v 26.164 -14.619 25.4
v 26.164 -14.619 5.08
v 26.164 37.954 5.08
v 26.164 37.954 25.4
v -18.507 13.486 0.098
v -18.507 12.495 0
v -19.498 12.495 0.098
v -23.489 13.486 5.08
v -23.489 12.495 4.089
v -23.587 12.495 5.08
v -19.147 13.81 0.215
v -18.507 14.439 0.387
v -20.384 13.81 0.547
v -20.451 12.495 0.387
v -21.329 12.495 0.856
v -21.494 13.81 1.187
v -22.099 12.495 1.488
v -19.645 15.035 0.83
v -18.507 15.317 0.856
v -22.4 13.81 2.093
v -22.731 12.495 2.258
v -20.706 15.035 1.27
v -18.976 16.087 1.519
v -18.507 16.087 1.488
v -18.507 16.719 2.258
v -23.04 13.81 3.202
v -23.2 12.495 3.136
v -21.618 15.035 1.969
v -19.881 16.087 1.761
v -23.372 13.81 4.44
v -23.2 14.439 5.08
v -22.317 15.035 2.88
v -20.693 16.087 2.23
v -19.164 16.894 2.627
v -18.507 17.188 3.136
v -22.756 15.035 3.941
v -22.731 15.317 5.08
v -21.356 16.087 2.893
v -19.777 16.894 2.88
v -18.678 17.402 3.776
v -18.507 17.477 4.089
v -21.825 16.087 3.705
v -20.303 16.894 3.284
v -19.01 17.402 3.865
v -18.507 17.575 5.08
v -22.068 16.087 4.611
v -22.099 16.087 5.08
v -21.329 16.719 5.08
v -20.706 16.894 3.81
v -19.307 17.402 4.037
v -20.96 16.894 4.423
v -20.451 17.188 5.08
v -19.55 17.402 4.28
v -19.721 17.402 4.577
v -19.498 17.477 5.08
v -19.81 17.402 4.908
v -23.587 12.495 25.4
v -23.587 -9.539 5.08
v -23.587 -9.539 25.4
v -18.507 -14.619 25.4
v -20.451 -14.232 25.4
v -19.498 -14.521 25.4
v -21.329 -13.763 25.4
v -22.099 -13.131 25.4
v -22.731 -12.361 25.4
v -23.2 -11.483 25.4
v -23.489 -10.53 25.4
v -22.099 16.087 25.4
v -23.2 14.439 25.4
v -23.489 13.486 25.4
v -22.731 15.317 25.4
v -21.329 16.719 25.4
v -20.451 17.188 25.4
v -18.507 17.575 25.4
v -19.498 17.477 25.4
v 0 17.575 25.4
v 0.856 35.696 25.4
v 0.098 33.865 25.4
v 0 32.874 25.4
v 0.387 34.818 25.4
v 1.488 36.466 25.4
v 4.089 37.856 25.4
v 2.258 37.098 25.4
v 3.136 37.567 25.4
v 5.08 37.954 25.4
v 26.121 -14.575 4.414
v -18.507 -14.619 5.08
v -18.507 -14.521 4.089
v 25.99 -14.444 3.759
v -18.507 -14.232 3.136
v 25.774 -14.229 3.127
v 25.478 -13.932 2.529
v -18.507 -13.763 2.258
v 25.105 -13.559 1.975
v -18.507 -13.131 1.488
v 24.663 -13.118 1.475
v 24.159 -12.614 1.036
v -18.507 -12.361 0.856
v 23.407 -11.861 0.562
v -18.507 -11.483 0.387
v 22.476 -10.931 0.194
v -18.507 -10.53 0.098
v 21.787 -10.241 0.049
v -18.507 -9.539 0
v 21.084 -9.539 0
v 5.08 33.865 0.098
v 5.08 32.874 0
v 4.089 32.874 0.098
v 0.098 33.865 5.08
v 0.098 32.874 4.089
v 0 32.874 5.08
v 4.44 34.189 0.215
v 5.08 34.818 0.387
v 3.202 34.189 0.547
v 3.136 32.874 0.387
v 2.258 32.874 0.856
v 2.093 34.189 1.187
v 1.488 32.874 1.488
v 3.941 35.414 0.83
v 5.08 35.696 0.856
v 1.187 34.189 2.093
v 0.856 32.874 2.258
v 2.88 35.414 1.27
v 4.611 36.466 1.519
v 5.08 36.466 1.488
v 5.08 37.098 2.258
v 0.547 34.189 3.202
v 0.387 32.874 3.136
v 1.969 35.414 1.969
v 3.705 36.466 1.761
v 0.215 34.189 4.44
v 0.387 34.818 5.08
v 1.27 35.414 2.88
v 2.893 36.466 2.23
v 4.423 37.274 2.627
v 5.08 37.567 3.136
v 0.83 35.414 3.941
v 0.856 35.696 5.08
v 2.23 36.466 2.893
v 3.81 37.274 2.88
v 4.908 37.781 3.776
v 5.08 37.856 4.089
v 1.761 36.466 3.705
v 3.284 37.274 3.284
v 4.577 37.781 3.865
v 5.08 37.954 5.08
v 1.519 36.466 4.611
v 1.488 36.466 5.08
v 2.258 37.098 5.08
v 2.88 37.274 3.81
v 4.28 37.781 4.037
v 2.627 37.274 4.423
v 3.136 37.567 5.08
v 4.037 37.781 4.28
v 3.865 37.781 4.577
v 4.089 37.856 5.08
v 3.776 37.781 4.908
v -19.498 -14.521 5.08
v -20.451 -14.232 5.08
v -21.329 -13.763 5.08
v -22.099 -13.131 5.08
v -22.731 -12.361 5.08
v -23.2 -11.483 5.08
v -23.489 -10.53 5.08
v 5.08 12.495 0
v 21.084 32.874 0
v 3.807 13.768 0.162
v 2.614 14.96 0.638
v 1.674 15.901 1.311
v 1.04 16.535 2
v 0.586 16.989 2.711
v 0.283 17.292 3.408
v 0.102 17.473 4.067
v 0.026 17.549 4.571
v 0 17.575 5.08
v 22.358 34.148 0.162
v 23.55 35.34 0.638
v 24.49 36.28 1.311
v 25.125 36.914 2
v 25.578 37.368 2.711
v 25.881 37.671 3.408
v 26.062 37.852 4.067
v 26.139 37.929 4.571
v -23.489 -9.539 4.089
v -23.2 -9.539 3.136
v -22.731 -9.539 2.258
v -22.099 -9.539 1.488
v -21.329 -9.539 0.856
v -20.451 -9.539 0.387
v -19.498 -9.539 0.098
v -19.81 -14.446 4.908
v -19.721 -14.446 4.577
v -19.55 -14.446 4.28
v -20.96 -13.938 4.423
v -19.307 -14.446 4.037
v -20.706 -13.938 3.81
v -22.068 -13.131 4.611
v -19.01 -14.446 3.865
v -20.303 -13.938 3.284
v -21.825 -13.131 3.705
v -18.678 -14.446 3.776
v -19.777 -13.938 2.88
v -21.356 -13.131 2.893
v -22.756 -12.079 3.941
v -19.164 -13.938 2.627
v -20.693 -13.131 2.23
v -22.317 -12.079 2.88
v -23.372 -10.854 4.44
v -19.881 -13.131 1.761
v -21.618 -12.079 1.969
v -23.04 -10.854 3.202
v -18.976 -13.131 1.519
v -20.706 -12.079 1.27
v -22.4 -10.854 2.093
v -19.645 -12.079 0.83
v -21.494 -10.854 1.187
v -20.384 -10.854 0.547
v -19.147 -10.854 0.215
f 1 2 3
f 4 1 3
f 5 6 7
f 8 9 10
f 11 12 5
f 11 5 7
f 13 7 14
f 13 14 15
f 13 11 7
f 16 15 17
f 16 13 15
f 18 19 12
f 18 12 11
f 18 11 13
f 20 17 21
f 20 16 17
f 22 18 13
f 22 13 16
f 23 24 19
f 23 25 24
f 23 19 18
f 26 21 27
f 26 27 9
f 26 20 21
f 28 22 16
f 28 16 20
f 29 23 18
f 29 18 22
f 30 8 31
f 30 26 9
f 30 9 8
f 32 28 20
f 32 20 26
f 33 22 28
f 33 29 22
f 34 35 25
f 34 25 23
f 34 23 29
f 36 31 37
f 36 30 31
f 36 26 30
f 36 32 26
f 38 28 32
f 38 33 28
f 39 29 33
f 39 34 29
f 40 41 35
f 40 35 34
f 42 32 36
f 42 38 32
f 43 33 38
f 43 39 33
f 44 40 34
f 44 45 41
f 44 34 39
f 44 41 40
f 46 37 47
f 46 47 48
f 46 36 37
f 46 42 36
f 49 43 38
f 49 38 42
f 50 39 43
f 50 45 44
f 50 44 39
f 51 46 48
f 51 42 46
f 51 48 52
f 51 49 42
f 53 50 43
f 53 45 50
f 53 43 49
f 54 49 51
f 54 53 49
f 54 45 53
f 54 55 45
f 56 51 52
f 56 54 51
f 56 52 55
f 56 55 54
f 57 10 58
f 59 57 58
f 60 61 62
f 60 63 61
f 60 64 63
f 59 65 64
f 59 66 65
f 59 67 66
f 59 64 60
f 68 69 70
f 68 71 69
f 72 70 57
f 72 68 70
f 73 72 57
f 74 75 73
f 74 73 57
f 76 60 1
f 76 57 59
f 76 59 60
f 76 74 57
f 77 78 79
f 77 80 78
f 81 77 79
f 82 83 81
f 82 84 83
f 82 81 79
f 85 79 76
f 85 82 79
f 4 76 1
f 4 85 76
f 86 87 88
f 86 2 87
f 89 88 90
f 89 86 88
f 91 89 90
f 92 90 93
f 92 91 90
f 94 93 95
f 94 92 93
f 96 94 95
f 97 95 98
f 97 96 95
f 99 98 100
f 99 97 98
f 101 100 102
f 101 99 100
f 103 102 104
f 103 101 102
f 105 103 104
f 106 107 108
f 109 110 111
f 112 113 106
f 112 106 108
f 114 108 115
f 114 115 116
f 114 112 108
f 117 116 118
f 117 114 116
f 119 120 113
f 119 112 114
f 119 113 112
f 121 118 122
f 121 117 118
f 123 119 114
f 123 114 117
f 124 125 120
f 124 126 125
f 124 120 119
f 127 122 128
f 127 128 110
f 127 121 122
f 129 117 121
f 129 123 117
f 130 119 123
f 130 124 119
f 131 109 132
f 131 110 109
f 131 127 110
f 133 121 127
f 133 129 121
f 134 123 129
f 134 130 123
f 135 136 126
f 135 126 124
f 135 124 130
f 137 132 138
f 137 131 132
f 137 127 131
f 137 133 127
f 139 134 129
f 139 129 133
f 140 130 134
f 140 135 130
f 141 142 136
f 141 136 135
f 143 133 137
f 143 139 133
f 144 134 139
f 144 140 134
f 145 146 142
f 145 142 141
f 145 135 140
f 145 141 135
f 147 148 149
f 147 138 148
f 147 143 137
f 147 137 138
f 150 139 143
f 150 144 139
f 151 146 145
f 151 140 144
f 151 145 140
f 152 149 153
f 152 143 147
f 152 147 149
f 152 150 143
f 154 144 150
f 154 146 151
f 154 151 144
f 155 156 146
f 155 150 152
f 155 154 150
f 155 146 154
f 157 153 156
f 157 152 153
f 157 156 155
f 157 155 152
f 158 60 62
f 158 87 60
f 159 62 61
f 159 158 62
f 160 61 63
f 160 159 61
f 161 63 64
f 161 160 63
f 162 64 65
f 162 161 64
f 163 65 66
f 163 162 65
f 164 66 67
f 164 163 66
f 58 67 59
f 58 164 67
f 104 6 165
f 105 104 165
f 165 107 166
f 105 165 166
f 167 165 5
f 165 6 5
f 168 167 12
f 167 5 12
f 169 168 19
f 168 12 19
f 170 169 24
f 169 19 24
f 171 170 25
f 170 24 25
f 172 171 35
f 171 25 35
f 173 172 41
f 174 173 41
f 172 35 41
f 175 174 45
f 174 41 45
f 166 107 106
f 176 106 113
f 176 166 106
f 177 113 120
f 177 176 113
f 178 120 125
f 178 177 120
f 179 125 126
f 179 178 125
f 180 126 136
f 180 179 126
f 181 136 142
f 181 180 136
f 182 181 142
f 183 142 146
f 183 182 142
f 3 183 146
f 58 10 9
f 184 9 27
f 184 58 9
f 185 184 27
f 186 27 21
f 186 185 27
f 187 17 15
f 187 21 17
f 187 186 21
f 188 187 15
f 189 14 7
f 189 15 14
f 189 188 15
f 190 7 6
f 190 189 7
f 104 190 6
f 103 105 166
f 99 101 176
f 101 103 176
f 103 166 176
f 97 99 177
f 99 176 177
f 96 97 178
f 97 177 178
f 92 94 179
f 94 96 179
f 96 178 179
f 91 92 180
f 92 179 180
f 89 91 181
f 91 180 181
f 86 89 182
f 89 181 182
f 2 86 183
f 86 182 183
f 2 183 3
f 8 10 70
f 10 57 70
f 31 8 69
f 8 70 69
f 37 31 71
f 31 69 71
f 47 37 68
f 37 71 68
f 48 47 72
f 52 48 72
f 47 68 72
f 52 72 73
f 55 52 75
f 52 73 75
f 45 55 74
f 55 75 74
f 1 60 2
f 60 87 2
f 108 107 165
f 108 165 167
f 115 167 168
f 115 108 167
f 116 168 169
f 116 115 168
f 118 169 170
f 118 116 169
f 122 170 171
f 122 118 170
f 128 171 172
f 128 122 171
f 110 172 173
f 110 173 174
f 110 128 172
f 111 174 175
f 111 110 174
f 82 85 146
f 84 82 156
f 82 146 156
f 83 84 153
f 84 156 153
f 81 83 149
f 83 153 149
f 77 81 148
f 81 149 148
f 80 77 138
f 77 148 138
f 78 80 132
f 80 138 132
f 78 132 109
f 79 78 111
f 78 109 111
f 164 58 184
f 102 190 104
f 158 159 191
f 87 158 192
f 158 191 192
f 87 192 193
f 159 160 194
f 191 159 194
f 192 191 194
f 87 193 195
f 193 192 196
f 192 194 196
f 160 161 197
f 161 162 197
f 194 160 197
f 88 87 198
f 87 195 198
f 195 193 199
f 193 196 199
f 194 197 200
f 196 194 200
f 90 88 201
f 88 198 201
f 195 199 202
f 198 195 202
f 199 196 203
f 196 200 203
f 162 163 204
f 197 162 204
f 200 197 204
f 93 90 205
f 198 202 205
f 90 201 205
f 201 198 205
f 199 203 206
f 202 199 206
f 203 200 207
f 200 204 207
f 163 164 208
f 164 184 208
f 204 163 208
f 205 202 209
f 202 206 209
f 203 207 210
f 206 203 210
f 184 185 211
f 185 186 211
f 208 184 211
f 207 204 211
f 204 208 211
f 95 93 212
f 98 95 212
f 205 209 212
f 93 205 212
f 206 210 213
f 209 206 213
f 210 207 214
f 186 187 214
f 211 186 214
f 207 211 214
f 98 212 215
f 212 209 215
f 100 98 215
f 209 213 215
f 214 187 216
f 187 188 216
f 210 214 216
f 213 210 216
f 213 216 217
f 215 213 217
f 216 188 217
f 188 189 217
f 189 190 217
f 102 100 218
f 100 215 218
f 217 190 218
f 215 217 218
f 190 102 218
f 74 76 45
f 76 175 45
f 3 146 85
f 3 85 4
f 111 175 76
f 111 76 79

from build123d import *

# Parameters (mm, degrees)
F0_W        = 23.5866680741
F0_H        = 16.0968005657
F0_W_2      = 26.164457202
F0_H_2      = 20.3793495893
F1_DEPTH    = 25.4
F2_R        = 5.08
F3_R        = 5.08
F4_T1_DEPTH = 33.02
F4_S5_W     = 5.08
F4_S5_H     = 5.08
F4_T6_DEPTH = 5.08


# Not quite as in the source:
# - a fillet or chamfer that OpenCascade refuses, or shapes differently, is made with other operations: its cross-section is extruded or revolved along the edge and cut away or added


with BuildPart() as f1:
    # F0 (on Top) → F1 (new body)
    with BuildSketch(Plane.XY):
        with Locations((-11.7933340371, -6.5704584122)):
            Rectangle(F0_W, F0_H)
        with Locations((13.082228601, 9.5263421535)):
            Rectangle(F0_W_2, F0_H)
        with Locations((-11.7933340371, 9.5263421535)):
            Rectangle(F0_W, F0_H)
        with Locations((13.082228601, 27.7644172311)):
            Rectangle(F0_W_2, F0_H_2)
        with Locations((13.082228601, -6.5704584122)):
            Rectangle(F0_W_2, F0_H)
    extrude(amount=F1_DEPTH)

    # F2
    f2_edges = [f1.edges().sort_by_distance(p)[0] for p in [
        (-23.586668, 1.477942, 0),
    ]]
    fillet(f2_edges, radius=F2_R)

    # F3
    f3_edges = [f1.edges().sort_by_distance(p)[0] for p in [
        (3.828895, -14.618859, 0),
        (-18.506668, 1.477942, 0),
        (26.164457, 11.667617, 0),
        (-9.253334, 17.574742, 0),
        (13.082229, 37.954092, 0),
        (0, 27.764417, 0),
    ]]
    fillet(f3_edges, radius=F3_R)

    # F4: fillet of radius 5.08 on 1 edges, made by hand

    # F4_s2 → F4_t1 (cut)
    with BuildSketch(Plane.XY.offset(5.08)):
        with BuildLine():
            ThreePointArc((5.08, 37.9540920258), (1.4878975516, 36.4661944742), (0, 32.8740920258))
            Line((0, 32.8740920258), (0, 37.9540920258))
            Line((0, 37.9540920258), (5.08, 37.9540920258))
        make_face()
    extrude(amount=F4_T1_DEPTH, mode=Mode.SUBTRACT)


with BuildPart() as f4_tool4:
    # F4_s5 → F4_t6 (new body)
    with BuildSketch(Plane.XZ.offset(-32.8740920258)):
        with Locations((2.54, 2.54)):
            Rectangle(F4_S5_W, F4_S5_H)
    extrude(amount=-F4_T6_DEPTH)

    # F4_s7 → F4_t8 (revolve, cut)
    with BuildSketch(Plane(origin=(5.08, 32.8740920258, 5.08), x_dir=(0.7071067812, 0, 0.7071067812), z_dir=(-0.7071067812, 0, 0.7071067812))):
        with BuildLine():
            ThreePointArc((0, -5.08), (5.08, 0), (0, 5.08))
            Line((0, 5.08), (0, -5.08))
        make_face()
    revolve(axis=Axis((5.08, 32.8740920258, 5.08), (0, 1, 0)), mode=Mode.SUBTRACT)


with BuildPart() as f1_1:
    add(f1.part)

    # F4_t3: cut F4_tool4
    add(f4_tool4.part, mode=Mode.SUBTRACT)


solid = f1_1.part
